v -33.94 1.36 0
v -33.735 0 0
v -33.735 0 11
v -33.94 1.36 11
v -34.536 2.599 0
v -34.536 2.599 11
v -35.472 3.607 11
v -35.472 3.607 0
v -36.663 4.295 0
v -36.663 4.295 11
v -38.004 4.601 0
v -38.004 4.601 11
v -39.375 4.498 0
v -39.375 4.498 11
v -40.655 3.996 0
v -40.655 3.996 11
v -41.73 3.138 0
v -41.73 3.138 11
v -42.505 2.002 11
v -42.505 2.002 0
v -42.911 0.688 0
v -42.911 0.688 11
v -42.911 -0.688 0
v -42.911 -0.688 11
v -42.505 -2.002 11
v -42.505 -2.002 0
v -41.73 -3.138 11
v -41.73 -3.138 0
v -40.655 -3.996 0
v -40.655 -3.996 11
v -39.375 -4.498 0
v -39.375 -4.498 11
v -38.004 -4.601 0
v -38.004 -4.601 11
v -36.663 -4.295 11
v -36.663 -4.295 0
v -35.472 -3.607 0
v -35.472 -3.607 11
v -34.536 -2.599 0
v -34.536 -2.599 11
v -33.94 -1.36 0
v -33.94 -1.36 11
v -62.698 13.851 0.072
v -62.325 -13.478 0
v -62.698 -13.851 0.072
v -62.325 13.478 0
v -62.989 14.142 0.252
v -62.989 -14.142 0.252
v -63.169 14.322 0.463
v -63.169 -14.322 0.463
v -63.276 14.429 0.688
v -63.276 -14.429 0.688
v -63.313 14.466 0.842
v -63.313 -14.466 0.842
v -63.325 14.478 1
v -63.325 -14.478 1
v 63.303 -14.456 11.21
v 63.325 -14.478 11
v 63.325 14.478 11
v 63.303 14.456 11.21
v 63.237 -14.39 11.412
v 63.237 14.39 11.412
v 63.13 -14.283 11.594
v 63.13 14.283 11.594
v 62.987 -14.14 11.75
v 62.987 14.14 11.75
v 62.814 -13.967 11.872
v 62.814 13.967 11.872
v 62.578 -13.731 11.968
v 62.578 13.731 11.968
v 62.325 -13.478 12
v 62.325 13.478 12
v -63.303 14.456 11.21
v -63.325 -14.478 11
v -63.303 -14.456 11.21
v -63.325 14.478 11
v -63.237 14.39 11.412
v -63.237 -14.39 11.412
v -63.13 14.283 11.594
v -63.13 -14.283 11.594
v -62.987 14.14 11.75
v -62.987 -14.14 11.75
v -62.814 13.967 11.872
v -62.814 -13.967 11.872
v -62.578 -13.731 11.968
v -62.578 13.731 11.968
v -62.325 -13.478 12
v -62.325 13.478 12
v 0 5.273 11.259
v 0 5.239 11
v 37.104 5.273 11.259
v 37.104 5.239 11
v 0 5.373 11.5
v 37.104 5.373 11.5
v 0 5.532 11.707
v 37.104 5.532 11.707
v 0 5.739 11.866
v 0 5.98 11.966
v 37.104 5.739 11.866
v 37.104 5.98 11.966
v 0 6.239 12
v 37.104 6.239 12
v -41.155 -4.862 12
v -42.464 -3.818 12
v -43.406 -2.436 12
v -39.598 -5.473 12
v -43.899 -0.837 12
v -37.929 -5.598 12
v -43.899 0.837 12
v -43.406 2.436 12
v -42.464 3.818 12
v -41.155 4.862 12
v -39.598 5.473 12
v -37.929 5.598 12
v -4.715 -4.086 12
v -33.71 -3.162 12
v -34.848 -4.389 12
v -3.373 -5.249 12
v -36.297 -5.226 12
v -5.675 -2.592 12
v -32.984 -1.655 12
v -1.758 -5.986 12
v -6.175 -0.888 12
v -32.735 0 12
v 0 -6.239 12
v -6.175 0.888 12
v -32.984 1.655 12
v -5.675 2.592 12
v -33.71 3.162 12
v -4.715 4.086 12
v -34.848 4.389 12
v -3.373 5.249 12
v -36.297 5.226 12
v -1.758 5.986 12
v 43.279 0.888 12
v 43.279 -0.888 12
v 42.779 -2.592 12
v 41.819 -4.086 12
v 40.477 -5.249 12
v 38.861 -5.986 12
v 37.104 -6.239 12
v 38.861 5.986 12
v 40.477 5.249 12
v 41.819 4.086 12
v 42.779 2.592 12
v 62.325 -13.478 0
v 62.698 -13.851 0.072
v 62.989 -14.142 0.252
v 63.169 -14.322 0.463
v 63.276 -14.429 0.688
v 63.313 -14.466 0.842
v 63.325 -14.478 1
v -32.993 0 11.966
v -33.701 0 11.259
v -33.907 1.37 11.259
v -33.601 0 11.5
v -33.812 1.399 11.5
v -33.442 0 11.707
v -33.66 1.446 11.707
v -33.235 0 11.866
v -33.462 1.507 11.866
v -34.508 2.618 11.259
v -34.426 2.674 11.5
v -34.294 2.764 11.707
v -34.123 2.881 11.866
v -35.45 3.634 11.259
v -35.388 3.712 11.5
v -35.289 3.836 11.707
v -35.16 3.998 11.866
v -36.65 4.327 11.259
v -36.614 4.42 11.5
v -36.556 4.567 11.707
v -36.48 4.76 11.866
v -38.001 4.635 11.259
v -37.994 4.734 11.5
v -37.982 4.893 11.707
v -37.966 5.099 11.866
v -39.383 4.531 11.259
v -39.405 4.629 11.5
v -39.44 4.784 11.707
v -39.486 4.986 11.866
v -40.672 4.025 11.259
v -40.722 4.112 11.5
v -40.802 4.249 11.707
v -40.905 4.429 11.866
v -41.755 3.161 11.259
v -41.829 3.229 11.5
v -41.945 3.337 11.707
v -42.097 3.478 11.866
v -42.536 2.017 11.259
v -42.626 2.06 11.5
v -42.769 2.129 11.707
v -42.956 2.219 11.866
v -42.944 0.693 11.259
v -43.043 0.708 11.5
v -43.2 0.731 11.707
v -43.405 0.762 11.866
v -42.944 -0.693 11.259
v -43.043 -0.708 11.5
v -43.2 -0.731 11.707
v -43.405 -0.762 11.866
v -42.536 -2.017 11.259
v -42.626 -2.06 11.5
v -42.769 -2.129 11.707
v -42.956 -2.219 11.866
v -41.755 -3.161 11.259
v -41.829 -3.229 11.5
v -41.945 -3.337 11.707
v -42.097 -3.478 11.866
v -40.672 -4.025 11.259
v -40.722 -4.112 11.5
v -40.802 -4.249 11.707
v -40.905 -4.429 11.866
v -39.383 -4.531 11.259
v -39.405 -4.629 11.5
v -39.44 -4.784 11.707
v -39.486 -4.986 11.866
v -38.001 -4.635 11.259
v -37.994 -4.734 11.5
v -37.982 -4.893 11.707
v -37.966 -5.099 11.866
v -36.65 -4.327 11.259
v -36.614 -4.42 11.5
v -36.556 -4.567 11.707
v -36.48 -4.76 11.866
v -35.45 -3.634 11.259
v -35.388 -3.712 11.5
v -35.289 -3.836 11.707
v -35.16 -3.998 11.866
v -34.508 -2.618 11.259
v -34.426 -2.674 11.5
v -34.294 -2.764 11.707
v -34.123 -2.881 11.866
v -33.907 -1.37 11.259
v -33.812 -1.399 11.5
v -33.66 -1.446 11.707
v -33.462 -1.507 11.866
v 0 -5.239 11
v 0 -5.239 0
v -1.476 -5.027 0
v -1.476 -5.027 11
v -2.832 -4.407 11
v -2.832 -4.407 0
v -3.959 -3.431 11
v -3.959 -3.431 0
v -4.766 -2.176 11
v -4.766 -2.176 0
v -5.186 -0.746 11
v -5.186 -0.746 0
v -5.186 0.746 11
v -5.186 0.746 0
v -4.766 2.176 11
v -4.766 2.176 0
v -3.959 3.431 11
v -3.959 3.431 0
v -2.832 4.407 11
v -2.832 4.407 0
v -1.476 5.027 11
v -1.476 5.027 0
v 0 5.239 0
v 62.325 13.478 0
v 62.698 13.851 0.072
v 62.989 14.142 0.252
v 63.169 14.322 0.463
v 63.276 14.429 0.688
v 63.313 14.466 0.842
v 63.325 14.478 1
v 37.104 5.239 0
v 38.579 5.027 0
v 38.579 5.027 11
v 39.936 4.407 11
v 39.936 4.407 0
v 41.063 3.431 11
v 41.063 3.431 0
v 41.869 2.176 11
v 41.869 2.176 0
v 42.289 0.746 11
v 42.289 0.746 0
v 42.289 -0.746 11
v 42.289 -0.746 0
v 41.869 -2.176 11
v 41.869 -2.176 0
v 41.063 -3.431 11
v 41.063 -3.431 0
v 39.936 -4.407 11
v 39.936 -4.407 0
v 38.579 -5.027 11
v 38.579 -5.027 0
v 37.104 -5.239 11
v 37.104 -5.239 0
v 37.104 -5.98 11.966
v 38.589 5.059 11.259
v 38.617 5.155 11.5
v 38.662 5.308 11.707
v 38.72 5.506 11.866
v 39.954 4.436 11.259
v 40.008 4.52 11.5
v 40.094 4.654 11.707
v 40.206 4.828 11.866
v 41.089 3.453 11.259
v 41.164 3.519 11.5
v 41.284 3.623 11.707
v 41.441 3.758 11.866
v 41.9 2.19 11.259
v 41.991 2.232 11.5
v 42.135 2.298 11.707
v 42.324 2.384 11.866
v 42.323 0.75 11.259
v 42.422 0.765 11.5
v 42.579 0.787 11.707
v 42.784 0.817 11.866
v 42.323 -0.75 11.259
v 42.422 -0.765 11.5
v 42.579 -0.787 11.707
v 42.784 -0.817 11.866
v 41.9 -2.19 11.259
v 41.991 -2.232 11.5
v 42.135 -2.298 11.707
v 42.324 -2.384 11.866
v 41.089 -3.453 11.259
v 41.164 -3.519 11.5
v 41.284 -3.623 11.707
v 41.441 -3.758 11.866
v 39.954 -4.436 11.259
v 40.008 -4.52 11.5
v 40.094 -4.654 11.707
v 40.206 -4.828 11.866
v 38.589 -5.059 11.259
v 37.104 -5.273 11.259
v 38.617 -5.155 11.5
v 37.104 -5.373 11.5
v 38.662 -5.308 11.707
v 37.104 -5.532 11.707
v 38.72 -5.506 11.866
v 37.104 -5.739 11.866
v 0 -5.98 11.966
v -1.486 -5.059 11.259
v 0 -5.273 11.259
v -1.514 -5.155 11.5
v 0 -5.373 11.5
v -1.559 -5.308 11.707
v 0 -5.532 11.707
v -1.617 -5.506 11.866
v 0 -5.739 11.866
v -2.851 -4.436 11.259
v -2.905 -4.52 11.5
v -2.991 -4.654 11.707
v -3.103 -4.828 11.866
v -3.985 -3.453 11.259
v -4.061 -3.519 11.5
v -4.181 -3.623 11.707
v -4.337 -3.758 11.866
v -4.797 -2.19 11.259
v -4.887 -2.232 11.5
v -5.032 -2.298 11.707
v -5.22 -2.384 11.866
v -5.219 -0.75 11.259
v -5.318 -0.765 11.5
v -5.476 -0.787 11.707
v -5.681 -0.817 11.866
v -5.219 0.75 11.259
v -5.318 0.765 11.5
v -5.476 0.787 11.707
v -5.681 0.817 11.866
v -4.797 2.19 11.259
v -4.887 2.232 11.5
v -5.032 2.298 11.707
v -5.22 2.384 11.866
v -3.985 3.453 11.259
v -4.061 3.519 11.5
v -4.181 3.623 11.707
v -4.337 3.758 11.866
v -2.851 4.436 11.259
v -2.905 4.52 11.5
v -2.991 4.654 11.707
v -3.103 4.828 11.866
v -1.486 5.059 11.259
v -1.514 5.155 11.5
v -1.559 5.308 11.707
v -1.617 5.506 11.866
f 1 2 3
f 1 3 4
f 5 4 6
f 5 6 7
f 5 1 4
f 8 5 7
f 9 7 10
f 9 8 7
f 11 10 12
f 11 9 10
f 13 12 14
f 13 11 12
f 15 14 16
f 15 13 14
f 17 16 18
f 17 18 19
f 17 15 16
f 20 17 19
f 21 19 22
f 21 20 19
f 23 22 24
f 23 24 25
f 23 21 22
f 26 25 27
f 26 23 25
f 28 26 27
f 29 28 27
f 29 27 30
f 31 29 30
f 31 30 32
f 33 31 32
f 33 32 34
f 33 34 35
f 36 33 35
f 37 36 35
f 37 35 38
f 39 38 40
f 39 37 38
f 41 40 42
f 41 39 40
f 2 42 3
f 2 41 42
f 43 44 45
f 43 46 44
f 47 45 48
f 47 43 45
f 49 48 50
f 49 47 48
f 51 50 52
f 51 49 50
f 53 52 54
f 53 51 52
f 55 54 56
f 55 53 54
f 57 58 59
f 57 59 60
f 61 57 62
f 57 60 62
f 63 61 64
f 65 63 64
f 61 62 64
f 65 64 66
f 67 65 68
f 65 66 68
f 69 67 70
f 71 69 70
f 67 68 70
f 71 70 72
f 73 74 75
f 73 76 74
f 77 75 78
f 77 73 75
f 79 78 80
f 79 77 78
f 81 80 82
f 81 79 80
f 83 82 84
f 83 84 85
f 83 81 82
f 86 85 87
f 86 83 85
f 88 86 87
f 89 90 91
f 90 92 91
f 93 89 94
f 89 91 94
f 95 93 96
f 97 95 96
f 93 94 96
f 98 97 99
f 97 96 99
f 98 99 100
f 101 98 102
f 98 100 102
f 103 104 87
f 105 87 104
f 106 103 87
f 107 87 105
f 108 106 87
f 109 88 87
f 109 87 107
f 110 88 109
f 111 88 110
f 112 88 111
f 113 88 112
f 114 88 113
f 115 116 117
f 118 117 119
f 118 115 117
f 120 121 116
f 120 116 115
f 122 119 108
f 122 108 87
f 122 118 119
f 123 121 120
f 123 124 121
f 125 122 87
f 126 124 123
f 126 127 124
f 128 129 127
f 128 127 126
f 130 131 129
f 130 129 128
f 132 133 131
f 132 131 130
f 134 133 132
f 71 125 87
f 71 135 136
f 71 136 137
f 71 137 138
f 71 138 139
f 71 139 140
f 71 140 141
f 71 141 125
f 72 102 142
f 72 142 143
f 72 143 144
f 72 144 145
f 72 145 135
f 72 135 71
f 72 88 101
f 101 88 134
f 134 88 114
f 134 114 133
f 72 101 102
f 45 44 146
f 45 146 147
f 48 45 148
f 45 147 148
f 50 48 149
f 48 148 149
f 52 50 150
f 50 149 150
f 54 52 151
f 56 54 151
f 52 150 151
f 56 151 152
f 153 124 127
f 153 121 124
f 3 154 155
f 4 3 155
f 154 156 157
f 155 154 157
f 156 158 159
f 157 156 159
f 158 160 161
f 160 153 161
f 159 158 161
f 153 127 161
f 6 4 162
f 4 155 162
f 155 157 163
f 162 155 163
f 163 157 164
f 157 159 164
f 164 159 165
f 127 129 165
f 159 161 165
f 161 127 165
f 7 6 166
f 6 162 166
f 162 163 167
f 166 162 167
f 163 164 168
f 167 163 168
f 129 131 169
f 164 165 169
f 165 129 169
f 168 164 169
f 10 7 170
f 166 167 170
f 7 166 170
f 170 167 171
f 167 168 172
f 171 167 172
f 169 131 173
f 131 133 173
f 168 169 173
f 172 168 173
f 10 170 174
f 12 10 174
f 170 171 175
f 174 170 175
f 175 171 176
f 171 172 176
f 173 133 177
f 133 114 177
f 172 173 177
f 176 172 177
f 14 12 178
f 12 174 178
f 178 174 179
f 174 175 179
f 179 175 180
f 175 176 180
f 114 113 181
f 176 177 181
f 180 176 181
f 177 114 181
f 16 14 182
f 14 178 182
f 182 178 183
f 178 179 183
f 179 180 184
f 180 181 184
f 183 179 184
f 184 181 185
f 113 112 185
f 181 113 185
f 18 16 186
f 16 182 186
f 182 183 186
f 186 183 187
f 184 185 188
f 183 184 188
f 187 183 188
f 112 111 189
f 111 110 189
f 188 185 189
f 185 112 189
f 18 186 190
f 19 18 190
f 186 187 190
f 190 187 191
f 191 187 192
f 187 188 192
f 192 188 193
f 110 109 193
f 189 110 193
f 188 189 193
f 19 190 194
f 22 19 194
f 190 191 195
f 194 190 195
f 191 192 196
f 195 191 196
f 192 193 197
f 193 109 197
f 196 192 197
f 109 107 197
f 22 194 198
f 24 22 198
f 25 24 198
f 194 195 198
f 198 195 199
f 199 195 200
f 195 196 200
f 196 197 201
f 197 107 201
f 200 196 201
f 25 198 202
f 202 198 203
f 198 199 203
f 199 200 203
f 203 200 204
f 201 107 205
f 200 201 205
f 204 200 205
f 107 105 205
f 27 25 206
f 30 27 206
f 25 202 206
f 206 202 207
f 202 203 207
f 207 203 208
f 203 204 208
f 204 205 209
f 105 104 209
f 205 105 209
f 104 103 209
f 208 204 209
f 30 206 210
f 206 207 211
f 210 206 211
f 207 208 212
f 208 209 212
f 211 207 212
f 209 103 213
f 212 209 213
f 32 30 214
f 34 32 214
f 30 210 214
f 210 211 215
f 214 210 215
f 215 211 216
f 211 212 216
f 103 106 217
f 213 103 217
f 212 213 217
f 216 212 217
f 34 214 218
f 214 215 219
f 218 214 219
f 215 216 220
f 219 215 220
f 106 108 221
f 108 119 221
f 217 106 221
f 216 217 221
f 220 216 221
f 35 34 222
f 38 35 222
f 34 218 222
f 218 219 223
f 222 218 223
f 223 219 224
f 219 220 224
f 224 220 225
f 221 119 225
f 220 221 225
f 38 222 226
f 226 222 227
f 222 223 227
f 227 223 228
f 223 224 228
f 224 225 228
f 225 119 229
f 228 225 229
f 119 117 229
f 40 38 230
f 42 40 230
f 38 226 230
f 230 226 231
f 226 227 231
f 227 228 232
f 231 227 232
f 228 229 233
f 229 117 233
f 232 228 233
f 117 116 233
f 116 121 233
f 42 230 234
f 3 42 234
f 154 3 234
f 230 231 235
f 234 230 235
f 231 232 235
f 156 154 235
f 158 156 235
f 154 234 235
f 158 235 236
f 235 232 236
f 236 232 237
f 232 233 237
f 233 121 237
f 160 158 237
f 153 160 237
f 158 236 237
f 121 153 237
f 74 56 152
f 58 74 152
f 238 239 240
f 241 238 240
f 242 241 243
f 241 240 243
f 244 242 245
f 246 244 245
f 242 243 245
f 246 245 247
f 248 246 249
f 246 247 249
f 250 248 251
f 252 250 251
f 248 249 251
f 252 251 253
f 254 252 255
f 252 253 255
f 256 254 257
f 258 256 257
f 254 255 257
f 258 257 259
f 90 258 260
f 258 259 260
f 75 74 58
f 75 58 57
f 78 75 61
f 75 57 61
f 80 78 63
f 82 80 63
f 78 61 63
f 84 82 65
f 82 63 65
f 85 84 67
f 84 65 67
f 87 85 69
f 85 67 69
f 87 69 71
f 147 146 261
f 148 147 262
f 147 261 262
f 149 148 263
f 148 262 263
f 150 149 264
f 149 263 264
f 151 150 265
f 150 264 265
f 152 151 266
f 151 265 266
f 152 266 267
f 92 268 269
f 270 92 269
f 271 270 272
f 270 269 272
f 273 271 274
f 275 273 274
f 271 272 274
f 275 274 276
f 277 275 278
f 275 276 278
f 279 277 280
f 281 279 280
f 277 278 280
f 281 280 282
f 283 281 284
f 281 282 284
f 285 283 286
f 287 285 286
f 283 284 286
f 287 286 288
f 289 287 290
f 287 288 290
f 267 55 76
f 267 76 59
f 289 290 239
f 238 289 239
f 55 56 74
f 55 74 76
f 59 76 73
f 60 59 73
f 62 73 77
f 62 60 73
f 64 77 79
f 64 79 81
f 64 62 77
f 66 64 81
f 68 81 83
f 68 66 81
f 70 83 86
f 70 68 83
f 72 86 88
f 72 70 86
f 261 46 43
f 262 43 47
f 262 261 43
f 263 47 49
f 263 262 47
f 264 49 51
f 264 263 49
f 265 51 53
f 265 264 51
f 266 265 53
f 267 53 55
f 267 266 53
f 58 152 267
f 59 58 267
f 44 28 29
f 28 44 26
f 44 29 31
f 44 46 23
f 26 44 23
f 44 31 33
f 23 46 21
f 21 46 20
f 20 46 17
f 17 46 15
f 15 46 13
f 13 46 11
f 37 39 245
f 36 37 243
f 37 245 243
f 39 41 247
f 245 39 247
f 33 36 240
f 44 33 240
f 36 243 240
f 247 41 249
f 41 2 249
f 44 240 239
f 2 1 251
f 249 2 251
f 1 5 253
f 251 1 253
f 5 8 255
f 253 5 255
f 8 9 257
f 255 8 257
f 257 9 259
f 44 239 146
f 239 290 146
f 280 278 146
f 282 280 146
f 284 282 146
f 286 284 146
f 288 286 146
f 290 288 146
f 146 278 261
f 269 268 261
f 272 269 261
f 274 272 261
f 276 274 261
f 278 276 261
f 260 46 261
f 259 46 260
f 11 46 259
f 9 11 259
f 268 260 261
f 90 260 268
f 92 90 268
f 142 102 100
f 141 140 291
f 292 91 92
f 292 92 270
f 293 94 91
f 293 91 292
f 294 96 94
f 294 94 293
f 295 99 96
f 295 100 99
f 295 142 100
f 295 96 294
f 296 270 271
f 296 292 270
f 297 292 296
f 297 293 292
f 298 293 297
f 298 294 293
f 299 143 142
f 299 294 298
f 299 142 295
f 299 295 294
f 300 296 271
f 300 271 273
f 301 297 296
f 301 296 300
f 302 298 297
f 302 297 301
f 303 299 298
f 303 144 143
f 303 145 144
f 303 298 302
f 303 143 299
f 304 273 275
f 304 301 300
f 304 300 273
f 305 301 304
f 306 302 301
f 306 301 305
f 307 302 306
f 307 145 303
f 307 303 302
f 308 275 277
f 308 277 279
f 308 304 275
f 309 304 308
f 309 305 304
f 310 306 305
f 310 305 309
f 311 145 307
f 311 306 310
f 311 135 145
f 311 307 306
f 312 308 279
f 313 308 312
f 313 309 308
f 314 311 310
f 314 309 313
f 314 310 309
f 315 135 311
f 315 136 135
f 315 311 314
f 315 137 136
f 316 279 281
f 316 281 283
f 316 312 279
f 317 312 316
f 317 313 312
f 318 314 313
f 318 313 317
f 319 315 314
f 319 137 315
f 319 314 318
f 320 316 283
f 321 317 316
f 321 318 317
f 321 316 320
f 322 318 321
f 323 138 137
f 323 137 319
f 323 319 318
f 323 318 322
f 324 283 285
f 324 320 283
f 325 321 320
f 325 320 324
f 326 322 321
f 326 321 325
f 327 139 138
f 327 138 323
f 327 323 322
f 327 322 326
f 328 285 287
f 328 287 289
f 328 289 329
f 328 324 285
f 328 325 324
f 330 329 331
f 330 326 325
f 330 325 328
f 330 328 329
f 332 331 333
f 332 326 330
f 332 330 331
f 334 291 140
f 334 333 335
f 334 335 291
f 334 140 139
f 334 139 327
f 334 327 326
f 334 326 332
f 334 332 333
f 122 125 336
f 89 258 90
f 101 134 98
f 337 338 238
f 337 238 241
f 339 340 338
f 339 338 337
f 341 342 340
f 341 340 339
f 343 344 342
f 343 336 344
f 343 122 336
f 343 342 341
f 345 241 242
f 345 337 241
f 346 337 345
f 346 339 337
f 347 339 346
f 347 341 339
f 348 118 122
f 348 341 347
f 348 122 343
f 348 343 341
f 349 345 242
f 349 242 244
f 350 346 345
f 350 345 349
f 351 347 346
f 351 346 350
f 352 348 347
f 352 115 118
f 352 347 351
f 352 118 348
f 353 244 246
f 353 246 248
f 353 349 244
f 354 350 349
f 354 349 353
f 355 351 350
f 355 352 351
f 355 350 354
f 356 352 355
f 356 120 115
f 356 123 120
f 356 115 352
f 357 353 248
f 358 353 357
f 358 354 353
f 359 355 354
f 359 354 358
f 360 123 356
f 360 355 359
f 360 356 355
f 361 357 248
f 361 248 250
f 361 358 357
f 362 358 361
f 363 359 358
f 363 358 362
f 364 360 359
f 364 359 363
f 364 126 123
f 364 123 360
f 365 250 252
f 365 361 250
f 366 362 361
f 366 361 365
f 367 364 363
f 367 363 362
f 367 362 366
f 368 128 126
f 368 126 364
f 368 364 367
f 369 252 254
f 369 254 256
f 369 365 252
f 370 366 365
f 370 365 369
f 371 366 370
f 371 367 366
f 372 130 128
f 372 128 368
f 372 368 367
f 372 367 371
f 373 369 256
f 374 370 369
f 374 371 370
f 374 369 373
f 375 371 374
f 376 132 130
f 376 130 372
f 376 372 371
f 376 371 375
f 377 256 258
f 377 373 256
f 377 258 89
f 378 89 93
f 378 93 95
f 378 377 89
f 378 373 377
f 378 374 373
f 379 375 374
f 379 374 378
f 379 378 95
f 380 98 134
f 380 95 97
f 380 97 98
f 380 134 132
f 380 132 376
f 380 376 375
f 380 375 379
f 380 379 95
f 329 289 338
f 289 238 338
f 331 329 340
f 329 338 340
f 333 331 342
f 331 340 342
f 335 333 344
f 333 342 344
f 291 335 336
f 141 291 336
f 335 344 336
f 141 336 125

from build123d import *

# Parameters (mm, degrees)
F0_W     = 126.65081
F0_H     = 28.956786
F0_R     = 4.613754
F1_DEPTH = 12
F2_R     = 1
F3_R     = 1
F4_R     = 1


with BuildPart() as f1:
    # F0 (on Top) → F1 (new body)
    with BuildSketch(Plane.XY):
        Rectangle(F0_W, F0_H)
        with Locations((-38.348339, 0)):
            Circle(F0_R, mode=Mode.SUBTRACT)
        with BuildLine():
            ThreePointArc((0, -5.238965), (-5.238965, 0), (0, 5.238965))
            Line((0, 5.238965), (37.103504, 5.238965))
            ThreePointArc((37.103504, 5.238965), (42.342469, 0), (37.103504, -5.238965))
            Line((37.103504, -5.238965), (0, -5.238965))
        make_face(mode=Mode.SUBTRACT)
    extrude(amount=F1_DEPTH)

    # F2
    f2_edges = [f1.edges().sort_by_distance(p)[0] for p in [
        (-42.962094, 0, 12),
        (42.342469, 0, 12),
    ]]
    fillet(f2_edges, radius=F2_R)

    # F3
    f3_edges = [f1.edges().sort_by_distance(p)[0] for p in [
        (0, -14.478393, 0),
        (0, 14.478393, 0),
        (63.325405, 0, 0),
        (-63.325405, 0, 0),
    ]]
    fillet(f3_edges, radius=F3_R)

    # F4
    f4_edges = [f1.edges().sort_by_distance(p)[0] for p in [
        (0, -14.478393, 12),
        (63.325405, 0, 12),
        (0, 14.478393, 12),
        (-63.325405, 0, 12),
    ]]
    fillet(f4_edges, radius=F4_R)


solid = f1.part
